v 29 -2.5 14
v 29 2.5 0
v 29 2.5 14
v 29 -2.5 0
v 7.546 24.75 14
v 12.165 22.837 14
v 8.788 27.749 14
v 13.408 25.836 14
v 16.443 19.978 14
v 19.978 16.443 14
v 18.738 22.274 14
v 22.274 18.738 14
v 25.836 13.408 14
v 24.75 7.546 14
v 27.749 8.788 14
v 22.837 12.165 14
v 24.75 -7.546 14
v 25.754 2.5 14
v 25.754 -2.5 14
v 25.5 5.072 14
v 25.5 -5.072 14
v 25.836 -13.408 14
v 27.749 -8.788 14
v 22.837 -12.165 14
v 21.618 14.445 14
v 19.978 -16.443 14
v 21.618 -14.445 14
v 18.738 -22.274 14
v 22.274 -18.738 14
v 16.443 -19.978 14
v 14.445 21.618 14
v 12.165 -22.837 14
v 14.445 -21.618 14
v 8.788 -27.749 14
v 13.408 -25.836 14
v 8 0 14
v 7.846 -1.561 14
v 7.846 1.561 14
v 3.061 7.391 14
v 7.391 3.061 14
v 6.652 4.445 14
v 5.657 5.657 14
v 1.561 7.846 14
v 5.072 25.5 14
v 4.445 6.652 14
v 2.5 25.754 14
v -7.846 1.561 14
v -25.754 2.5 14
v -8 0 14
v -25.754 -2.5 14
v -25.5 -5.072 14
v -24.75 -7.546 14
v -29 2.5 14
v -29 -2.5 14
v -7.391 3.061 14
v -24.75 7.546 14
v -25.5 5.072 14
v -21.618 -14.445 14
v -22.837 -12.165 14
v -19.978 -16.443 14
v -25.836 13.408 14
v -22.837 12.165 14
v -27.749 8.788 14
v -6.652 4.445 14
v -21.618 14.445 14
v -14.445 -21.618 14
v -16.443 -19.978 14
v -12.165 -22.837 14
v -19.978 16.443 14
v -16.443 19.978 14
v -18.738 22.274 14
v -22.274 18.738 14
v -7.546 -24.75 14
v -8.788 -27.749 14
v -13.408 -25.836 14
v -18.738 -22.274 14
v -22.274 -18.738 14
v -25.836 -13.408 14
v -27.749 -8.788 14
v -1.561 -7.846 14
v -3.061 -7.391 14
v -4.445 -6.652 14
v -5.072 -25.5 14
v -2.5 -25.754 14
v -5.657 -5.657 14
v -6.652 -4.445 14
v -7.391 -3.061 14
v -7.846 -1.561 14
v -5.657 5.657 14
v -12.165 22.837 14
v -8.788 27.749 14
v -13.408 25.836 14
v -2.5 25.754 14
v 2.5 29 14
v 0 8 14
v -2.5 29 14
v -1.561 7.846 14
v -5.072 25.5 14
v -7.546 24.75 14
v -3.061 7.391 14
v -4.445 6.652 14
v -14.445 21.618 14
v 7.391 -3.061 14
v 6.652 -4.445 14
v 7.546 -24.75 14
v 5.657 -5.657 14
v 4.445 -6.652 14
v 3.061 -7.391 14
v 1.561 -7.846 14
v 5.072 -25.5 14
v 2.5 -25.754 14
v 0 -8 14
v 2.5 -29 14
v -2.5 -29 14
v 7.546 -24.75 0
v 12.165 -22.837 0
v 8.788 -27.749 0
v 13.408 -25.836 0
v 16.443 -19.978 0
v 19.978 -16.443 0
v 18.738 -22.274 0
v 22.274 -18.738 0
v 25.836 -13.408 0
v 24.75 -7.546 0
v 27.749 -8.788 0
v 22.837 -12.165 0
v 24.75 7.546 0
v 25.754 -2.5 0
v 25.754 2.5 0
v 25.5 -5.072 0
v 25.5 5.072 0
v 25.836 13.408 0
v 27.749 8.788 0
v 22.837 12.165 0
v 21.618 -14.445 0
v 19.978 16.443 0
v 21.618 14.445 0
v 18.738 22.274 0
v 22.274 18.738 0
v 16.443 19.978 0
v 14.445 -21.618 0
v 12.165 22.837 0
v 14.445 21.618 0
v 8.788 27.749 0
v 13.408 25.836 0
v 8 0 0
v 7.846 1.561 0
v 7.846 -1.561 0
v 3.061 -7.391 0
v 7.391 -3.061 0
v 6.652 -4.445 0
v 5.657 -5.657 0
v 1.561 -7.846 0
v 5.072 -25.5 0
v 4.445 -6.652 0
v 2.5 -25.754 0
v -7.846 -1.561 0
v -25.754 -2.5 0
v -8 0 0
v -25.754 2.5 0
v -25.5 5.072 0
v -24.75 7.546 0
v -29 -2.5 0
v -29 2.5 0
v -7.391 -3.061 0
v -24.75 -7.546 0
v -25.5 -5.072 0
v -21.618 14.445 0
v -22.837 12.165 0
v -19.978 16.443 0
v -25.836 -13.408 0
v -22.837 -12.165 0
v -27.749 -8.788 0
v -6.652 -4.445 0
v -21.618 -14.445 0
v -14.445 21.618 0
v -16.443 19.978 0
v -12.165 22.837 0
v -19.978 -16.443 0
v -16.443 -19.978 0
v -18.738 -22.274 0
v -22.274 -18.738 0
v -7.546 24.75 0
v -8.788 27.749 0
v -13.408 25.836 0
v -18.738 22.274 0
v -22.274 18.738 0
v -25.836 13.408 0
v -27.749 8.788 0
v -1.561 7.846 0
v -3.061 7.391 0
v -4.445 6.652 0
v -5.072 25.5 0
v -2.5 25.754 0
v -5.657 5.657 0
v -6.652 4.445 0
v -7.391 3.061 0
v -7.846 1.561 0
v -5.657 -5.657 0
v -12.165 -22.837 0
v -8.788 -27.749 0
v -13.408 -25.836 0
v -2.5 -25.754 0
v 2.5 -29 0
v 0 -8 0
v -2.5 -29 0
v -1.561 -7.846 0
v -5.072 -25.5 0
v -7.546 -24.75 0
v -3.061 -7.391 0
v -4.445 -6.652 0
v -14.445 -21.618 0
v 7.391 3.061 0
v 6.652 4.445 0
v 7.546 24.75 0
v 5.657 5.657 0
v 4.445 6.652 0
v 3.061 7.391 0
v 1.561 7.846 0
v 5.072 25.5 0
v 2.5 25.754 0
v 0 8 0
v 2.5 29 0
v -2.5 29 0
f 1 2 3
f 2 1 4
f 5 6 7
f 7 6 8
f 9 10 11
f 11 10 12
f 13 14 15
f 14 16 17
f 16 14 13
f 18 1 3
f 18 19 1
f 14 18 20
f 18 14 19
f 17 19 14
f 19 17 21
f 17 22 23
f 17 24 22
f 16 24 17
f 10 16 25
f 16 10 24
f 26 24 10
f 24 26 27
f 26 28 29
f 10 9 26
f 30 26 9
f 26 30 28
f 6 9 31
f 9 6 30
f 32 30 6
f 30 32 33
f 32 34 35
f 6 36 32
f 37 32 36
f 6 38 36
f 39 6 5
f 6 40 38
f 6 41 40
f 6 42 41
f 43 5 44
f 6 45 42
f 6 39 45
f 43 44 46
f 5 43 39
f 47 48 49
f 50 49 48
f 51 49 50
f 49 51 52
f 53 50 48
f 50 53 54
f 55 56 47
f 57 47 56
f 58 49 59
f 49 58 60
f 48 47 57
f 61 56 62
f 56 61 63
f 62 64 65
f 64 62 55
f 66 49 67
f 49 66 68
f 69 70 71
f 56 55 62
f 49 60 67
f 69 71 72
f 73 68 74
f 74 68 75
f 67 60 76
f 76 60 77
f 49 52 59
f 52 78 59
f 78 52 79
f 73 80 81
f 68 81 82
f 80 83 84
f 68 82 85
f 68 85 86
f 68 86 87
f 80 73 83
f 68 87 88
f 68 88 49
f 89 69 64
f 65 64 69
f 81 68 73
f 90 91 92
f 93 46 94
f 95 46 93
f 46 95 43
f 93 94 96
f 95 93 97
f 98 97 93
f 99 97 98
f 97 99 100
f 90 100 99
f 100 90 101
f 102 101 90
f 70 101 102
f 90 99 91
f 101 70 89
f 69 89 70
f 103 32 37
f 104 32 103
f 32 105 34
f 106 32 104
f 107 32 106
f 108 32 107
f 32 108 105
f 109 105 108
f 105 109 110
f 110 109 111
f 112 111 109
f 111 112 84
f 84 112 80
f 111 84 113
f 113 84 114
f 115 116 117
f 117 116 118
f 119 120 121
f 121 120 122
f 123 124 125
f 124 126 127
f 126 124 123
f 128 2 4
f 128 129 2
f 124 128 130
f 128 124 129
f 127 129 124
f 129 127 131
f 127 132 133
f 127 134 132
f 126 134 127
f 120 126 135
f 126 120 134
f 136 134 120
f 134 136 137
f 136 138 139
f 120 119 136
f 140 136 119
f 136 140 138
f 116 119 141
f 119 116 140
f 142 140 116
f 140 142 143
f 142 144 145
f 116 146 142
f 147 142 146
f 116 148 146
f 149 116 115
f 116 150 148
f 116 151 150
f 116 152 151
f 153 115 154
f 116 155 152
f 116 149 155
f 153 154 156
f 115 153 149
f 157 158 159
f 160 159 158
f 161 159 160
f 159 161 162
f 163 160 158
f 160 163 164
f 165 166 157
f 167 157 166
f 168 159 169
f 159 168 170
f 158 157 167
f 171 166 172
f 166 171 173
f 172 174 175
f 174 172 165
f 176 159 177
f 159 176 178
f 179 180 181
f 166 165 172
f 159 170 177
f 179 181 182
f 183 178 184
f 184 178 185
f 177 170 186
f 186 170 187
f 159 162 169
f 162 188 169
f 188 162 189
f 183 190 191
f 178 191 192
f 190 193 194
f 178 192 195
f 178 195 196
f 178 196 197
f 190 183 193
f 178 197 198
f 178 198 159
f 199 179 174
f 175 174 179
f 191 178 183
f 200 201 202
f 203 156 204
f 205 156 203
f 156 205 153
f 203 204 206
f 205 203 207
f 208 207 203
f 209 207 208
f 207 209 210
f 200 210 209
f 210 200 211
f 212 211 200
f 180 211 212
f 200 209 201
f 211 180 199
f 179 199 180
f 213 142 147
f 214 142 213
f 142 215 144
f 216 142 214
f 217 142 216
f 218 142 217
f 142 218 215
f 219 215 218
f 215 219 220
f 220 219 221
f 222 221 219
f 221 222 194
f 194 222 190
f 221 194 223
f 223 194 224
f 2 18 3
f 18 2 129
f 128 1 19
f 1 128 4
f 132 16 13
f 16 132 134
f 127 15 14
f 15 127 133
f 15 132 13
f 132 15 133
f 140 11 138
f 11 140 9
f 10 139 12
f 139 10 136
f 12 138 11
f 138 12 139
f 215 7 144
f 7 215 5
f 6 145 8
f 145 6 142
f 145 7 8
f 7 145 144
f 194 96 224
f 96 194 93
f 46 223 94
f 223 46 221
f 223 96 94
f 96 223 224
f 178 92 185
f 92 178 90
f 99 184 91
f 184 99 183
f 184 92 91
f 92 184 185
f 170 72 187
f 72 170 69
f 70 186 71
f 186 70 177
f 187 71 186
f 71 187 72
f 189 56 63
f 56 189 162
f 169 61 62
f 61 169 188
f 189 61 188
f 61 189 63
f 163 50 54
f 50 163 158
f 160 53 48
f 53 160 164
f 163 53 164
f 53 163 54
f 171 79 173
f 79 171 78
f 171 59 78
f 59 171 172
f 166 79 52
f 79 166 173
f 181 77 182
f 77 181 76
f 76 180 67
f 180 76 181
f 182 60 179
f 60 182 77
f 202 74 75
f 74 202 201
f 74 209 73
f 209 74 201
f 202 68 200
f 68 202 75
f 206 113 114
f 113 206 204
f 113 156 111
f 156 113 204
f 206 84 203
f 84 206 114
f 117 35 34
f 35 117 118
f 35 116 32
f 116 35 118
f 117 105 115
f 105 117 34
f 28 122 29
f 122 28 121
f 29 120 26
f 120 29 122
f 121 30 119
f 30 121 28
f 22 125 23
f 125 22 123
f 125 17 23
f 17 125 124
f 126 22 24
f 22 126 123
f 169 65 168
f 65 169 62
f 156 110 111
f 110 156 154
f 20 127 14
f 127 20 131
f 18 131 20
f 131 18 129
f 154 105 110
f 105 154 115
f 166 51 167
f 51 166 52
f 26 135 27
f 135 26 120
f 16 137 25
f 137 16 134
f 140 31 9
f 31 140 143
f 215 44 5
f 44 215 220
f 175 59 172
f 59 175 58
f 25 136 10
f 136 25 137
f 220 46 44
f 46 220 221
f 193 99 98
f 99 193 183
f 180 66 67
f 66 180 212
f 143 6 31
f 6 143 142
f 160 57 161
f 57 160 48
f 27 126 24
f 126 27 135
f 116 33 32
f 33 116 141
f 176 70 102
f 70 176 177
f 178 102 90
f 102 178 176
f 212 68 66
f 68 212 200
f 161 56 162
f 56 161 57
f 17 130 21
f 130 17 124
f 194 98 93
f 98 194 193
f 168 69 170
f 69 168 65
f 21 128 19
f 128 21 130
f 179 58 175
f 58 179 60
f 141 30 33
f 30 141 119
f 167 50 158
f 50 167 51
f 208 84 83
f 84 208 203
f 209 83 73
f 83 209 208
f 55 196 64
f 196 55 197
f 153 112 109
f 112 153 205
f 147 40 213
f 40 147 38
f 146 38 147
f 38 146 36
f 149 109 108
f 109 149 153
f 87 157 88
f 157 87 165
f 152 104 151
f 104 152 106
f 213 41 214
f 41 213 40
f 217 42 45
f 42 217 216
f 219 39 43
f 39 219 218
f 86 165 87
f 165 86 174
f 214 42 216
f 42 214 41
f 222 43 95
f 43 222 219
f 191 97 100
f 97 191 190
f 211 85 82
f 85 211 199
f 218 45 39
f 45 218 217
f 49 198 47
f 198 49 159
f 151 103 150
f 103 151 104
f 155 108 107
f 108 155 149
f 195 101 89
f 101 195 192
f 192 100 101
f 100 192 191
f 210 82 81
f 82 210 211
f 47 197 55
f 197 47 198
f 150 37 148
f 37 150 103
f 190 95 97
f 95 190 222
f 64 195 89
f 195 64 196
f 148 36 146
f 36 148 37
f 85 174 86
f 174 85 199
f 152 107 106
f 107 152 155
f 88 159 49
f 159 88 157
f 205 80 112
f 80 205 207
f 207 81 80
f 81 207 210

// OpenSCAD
$fn = 32;

// ----------------------------------------------------------------------
// Spur blank: bored gear blank
// ----------------------------------------------------------------------

// --- parameters (mm) ---
disc_r = 26;              // blank root radius
disc_t = 14;              // blank thickness
n_teeth = 16;             // stub tooth count
tooth_w = 5;              // tooth width at the root
tooth_h = 3;              // tooth height above the root
bore_r = 8;               // central bore radius

out_r = disc_r + tooth_h;  // tip radius
bbox_x = 58.0;  // measured width over the teeth
bbox_y = 58.0;  // measured depth over the teeth

difference() {
union() {
  cylinder(r = disc_r, h = disc_t);
  for (i = [0 : n_teeth - 1])
    rotate([0, 0, i * 360 / n_teeth])
      translate([disc_r - 1, -tooth_w / 2, 0])
        cube([tooth_h + 1, tooth_w, disc_t]);
}
  translate([0, 0, -1]) cylinder(r = bore_r, h = disc_t + 2);
}
